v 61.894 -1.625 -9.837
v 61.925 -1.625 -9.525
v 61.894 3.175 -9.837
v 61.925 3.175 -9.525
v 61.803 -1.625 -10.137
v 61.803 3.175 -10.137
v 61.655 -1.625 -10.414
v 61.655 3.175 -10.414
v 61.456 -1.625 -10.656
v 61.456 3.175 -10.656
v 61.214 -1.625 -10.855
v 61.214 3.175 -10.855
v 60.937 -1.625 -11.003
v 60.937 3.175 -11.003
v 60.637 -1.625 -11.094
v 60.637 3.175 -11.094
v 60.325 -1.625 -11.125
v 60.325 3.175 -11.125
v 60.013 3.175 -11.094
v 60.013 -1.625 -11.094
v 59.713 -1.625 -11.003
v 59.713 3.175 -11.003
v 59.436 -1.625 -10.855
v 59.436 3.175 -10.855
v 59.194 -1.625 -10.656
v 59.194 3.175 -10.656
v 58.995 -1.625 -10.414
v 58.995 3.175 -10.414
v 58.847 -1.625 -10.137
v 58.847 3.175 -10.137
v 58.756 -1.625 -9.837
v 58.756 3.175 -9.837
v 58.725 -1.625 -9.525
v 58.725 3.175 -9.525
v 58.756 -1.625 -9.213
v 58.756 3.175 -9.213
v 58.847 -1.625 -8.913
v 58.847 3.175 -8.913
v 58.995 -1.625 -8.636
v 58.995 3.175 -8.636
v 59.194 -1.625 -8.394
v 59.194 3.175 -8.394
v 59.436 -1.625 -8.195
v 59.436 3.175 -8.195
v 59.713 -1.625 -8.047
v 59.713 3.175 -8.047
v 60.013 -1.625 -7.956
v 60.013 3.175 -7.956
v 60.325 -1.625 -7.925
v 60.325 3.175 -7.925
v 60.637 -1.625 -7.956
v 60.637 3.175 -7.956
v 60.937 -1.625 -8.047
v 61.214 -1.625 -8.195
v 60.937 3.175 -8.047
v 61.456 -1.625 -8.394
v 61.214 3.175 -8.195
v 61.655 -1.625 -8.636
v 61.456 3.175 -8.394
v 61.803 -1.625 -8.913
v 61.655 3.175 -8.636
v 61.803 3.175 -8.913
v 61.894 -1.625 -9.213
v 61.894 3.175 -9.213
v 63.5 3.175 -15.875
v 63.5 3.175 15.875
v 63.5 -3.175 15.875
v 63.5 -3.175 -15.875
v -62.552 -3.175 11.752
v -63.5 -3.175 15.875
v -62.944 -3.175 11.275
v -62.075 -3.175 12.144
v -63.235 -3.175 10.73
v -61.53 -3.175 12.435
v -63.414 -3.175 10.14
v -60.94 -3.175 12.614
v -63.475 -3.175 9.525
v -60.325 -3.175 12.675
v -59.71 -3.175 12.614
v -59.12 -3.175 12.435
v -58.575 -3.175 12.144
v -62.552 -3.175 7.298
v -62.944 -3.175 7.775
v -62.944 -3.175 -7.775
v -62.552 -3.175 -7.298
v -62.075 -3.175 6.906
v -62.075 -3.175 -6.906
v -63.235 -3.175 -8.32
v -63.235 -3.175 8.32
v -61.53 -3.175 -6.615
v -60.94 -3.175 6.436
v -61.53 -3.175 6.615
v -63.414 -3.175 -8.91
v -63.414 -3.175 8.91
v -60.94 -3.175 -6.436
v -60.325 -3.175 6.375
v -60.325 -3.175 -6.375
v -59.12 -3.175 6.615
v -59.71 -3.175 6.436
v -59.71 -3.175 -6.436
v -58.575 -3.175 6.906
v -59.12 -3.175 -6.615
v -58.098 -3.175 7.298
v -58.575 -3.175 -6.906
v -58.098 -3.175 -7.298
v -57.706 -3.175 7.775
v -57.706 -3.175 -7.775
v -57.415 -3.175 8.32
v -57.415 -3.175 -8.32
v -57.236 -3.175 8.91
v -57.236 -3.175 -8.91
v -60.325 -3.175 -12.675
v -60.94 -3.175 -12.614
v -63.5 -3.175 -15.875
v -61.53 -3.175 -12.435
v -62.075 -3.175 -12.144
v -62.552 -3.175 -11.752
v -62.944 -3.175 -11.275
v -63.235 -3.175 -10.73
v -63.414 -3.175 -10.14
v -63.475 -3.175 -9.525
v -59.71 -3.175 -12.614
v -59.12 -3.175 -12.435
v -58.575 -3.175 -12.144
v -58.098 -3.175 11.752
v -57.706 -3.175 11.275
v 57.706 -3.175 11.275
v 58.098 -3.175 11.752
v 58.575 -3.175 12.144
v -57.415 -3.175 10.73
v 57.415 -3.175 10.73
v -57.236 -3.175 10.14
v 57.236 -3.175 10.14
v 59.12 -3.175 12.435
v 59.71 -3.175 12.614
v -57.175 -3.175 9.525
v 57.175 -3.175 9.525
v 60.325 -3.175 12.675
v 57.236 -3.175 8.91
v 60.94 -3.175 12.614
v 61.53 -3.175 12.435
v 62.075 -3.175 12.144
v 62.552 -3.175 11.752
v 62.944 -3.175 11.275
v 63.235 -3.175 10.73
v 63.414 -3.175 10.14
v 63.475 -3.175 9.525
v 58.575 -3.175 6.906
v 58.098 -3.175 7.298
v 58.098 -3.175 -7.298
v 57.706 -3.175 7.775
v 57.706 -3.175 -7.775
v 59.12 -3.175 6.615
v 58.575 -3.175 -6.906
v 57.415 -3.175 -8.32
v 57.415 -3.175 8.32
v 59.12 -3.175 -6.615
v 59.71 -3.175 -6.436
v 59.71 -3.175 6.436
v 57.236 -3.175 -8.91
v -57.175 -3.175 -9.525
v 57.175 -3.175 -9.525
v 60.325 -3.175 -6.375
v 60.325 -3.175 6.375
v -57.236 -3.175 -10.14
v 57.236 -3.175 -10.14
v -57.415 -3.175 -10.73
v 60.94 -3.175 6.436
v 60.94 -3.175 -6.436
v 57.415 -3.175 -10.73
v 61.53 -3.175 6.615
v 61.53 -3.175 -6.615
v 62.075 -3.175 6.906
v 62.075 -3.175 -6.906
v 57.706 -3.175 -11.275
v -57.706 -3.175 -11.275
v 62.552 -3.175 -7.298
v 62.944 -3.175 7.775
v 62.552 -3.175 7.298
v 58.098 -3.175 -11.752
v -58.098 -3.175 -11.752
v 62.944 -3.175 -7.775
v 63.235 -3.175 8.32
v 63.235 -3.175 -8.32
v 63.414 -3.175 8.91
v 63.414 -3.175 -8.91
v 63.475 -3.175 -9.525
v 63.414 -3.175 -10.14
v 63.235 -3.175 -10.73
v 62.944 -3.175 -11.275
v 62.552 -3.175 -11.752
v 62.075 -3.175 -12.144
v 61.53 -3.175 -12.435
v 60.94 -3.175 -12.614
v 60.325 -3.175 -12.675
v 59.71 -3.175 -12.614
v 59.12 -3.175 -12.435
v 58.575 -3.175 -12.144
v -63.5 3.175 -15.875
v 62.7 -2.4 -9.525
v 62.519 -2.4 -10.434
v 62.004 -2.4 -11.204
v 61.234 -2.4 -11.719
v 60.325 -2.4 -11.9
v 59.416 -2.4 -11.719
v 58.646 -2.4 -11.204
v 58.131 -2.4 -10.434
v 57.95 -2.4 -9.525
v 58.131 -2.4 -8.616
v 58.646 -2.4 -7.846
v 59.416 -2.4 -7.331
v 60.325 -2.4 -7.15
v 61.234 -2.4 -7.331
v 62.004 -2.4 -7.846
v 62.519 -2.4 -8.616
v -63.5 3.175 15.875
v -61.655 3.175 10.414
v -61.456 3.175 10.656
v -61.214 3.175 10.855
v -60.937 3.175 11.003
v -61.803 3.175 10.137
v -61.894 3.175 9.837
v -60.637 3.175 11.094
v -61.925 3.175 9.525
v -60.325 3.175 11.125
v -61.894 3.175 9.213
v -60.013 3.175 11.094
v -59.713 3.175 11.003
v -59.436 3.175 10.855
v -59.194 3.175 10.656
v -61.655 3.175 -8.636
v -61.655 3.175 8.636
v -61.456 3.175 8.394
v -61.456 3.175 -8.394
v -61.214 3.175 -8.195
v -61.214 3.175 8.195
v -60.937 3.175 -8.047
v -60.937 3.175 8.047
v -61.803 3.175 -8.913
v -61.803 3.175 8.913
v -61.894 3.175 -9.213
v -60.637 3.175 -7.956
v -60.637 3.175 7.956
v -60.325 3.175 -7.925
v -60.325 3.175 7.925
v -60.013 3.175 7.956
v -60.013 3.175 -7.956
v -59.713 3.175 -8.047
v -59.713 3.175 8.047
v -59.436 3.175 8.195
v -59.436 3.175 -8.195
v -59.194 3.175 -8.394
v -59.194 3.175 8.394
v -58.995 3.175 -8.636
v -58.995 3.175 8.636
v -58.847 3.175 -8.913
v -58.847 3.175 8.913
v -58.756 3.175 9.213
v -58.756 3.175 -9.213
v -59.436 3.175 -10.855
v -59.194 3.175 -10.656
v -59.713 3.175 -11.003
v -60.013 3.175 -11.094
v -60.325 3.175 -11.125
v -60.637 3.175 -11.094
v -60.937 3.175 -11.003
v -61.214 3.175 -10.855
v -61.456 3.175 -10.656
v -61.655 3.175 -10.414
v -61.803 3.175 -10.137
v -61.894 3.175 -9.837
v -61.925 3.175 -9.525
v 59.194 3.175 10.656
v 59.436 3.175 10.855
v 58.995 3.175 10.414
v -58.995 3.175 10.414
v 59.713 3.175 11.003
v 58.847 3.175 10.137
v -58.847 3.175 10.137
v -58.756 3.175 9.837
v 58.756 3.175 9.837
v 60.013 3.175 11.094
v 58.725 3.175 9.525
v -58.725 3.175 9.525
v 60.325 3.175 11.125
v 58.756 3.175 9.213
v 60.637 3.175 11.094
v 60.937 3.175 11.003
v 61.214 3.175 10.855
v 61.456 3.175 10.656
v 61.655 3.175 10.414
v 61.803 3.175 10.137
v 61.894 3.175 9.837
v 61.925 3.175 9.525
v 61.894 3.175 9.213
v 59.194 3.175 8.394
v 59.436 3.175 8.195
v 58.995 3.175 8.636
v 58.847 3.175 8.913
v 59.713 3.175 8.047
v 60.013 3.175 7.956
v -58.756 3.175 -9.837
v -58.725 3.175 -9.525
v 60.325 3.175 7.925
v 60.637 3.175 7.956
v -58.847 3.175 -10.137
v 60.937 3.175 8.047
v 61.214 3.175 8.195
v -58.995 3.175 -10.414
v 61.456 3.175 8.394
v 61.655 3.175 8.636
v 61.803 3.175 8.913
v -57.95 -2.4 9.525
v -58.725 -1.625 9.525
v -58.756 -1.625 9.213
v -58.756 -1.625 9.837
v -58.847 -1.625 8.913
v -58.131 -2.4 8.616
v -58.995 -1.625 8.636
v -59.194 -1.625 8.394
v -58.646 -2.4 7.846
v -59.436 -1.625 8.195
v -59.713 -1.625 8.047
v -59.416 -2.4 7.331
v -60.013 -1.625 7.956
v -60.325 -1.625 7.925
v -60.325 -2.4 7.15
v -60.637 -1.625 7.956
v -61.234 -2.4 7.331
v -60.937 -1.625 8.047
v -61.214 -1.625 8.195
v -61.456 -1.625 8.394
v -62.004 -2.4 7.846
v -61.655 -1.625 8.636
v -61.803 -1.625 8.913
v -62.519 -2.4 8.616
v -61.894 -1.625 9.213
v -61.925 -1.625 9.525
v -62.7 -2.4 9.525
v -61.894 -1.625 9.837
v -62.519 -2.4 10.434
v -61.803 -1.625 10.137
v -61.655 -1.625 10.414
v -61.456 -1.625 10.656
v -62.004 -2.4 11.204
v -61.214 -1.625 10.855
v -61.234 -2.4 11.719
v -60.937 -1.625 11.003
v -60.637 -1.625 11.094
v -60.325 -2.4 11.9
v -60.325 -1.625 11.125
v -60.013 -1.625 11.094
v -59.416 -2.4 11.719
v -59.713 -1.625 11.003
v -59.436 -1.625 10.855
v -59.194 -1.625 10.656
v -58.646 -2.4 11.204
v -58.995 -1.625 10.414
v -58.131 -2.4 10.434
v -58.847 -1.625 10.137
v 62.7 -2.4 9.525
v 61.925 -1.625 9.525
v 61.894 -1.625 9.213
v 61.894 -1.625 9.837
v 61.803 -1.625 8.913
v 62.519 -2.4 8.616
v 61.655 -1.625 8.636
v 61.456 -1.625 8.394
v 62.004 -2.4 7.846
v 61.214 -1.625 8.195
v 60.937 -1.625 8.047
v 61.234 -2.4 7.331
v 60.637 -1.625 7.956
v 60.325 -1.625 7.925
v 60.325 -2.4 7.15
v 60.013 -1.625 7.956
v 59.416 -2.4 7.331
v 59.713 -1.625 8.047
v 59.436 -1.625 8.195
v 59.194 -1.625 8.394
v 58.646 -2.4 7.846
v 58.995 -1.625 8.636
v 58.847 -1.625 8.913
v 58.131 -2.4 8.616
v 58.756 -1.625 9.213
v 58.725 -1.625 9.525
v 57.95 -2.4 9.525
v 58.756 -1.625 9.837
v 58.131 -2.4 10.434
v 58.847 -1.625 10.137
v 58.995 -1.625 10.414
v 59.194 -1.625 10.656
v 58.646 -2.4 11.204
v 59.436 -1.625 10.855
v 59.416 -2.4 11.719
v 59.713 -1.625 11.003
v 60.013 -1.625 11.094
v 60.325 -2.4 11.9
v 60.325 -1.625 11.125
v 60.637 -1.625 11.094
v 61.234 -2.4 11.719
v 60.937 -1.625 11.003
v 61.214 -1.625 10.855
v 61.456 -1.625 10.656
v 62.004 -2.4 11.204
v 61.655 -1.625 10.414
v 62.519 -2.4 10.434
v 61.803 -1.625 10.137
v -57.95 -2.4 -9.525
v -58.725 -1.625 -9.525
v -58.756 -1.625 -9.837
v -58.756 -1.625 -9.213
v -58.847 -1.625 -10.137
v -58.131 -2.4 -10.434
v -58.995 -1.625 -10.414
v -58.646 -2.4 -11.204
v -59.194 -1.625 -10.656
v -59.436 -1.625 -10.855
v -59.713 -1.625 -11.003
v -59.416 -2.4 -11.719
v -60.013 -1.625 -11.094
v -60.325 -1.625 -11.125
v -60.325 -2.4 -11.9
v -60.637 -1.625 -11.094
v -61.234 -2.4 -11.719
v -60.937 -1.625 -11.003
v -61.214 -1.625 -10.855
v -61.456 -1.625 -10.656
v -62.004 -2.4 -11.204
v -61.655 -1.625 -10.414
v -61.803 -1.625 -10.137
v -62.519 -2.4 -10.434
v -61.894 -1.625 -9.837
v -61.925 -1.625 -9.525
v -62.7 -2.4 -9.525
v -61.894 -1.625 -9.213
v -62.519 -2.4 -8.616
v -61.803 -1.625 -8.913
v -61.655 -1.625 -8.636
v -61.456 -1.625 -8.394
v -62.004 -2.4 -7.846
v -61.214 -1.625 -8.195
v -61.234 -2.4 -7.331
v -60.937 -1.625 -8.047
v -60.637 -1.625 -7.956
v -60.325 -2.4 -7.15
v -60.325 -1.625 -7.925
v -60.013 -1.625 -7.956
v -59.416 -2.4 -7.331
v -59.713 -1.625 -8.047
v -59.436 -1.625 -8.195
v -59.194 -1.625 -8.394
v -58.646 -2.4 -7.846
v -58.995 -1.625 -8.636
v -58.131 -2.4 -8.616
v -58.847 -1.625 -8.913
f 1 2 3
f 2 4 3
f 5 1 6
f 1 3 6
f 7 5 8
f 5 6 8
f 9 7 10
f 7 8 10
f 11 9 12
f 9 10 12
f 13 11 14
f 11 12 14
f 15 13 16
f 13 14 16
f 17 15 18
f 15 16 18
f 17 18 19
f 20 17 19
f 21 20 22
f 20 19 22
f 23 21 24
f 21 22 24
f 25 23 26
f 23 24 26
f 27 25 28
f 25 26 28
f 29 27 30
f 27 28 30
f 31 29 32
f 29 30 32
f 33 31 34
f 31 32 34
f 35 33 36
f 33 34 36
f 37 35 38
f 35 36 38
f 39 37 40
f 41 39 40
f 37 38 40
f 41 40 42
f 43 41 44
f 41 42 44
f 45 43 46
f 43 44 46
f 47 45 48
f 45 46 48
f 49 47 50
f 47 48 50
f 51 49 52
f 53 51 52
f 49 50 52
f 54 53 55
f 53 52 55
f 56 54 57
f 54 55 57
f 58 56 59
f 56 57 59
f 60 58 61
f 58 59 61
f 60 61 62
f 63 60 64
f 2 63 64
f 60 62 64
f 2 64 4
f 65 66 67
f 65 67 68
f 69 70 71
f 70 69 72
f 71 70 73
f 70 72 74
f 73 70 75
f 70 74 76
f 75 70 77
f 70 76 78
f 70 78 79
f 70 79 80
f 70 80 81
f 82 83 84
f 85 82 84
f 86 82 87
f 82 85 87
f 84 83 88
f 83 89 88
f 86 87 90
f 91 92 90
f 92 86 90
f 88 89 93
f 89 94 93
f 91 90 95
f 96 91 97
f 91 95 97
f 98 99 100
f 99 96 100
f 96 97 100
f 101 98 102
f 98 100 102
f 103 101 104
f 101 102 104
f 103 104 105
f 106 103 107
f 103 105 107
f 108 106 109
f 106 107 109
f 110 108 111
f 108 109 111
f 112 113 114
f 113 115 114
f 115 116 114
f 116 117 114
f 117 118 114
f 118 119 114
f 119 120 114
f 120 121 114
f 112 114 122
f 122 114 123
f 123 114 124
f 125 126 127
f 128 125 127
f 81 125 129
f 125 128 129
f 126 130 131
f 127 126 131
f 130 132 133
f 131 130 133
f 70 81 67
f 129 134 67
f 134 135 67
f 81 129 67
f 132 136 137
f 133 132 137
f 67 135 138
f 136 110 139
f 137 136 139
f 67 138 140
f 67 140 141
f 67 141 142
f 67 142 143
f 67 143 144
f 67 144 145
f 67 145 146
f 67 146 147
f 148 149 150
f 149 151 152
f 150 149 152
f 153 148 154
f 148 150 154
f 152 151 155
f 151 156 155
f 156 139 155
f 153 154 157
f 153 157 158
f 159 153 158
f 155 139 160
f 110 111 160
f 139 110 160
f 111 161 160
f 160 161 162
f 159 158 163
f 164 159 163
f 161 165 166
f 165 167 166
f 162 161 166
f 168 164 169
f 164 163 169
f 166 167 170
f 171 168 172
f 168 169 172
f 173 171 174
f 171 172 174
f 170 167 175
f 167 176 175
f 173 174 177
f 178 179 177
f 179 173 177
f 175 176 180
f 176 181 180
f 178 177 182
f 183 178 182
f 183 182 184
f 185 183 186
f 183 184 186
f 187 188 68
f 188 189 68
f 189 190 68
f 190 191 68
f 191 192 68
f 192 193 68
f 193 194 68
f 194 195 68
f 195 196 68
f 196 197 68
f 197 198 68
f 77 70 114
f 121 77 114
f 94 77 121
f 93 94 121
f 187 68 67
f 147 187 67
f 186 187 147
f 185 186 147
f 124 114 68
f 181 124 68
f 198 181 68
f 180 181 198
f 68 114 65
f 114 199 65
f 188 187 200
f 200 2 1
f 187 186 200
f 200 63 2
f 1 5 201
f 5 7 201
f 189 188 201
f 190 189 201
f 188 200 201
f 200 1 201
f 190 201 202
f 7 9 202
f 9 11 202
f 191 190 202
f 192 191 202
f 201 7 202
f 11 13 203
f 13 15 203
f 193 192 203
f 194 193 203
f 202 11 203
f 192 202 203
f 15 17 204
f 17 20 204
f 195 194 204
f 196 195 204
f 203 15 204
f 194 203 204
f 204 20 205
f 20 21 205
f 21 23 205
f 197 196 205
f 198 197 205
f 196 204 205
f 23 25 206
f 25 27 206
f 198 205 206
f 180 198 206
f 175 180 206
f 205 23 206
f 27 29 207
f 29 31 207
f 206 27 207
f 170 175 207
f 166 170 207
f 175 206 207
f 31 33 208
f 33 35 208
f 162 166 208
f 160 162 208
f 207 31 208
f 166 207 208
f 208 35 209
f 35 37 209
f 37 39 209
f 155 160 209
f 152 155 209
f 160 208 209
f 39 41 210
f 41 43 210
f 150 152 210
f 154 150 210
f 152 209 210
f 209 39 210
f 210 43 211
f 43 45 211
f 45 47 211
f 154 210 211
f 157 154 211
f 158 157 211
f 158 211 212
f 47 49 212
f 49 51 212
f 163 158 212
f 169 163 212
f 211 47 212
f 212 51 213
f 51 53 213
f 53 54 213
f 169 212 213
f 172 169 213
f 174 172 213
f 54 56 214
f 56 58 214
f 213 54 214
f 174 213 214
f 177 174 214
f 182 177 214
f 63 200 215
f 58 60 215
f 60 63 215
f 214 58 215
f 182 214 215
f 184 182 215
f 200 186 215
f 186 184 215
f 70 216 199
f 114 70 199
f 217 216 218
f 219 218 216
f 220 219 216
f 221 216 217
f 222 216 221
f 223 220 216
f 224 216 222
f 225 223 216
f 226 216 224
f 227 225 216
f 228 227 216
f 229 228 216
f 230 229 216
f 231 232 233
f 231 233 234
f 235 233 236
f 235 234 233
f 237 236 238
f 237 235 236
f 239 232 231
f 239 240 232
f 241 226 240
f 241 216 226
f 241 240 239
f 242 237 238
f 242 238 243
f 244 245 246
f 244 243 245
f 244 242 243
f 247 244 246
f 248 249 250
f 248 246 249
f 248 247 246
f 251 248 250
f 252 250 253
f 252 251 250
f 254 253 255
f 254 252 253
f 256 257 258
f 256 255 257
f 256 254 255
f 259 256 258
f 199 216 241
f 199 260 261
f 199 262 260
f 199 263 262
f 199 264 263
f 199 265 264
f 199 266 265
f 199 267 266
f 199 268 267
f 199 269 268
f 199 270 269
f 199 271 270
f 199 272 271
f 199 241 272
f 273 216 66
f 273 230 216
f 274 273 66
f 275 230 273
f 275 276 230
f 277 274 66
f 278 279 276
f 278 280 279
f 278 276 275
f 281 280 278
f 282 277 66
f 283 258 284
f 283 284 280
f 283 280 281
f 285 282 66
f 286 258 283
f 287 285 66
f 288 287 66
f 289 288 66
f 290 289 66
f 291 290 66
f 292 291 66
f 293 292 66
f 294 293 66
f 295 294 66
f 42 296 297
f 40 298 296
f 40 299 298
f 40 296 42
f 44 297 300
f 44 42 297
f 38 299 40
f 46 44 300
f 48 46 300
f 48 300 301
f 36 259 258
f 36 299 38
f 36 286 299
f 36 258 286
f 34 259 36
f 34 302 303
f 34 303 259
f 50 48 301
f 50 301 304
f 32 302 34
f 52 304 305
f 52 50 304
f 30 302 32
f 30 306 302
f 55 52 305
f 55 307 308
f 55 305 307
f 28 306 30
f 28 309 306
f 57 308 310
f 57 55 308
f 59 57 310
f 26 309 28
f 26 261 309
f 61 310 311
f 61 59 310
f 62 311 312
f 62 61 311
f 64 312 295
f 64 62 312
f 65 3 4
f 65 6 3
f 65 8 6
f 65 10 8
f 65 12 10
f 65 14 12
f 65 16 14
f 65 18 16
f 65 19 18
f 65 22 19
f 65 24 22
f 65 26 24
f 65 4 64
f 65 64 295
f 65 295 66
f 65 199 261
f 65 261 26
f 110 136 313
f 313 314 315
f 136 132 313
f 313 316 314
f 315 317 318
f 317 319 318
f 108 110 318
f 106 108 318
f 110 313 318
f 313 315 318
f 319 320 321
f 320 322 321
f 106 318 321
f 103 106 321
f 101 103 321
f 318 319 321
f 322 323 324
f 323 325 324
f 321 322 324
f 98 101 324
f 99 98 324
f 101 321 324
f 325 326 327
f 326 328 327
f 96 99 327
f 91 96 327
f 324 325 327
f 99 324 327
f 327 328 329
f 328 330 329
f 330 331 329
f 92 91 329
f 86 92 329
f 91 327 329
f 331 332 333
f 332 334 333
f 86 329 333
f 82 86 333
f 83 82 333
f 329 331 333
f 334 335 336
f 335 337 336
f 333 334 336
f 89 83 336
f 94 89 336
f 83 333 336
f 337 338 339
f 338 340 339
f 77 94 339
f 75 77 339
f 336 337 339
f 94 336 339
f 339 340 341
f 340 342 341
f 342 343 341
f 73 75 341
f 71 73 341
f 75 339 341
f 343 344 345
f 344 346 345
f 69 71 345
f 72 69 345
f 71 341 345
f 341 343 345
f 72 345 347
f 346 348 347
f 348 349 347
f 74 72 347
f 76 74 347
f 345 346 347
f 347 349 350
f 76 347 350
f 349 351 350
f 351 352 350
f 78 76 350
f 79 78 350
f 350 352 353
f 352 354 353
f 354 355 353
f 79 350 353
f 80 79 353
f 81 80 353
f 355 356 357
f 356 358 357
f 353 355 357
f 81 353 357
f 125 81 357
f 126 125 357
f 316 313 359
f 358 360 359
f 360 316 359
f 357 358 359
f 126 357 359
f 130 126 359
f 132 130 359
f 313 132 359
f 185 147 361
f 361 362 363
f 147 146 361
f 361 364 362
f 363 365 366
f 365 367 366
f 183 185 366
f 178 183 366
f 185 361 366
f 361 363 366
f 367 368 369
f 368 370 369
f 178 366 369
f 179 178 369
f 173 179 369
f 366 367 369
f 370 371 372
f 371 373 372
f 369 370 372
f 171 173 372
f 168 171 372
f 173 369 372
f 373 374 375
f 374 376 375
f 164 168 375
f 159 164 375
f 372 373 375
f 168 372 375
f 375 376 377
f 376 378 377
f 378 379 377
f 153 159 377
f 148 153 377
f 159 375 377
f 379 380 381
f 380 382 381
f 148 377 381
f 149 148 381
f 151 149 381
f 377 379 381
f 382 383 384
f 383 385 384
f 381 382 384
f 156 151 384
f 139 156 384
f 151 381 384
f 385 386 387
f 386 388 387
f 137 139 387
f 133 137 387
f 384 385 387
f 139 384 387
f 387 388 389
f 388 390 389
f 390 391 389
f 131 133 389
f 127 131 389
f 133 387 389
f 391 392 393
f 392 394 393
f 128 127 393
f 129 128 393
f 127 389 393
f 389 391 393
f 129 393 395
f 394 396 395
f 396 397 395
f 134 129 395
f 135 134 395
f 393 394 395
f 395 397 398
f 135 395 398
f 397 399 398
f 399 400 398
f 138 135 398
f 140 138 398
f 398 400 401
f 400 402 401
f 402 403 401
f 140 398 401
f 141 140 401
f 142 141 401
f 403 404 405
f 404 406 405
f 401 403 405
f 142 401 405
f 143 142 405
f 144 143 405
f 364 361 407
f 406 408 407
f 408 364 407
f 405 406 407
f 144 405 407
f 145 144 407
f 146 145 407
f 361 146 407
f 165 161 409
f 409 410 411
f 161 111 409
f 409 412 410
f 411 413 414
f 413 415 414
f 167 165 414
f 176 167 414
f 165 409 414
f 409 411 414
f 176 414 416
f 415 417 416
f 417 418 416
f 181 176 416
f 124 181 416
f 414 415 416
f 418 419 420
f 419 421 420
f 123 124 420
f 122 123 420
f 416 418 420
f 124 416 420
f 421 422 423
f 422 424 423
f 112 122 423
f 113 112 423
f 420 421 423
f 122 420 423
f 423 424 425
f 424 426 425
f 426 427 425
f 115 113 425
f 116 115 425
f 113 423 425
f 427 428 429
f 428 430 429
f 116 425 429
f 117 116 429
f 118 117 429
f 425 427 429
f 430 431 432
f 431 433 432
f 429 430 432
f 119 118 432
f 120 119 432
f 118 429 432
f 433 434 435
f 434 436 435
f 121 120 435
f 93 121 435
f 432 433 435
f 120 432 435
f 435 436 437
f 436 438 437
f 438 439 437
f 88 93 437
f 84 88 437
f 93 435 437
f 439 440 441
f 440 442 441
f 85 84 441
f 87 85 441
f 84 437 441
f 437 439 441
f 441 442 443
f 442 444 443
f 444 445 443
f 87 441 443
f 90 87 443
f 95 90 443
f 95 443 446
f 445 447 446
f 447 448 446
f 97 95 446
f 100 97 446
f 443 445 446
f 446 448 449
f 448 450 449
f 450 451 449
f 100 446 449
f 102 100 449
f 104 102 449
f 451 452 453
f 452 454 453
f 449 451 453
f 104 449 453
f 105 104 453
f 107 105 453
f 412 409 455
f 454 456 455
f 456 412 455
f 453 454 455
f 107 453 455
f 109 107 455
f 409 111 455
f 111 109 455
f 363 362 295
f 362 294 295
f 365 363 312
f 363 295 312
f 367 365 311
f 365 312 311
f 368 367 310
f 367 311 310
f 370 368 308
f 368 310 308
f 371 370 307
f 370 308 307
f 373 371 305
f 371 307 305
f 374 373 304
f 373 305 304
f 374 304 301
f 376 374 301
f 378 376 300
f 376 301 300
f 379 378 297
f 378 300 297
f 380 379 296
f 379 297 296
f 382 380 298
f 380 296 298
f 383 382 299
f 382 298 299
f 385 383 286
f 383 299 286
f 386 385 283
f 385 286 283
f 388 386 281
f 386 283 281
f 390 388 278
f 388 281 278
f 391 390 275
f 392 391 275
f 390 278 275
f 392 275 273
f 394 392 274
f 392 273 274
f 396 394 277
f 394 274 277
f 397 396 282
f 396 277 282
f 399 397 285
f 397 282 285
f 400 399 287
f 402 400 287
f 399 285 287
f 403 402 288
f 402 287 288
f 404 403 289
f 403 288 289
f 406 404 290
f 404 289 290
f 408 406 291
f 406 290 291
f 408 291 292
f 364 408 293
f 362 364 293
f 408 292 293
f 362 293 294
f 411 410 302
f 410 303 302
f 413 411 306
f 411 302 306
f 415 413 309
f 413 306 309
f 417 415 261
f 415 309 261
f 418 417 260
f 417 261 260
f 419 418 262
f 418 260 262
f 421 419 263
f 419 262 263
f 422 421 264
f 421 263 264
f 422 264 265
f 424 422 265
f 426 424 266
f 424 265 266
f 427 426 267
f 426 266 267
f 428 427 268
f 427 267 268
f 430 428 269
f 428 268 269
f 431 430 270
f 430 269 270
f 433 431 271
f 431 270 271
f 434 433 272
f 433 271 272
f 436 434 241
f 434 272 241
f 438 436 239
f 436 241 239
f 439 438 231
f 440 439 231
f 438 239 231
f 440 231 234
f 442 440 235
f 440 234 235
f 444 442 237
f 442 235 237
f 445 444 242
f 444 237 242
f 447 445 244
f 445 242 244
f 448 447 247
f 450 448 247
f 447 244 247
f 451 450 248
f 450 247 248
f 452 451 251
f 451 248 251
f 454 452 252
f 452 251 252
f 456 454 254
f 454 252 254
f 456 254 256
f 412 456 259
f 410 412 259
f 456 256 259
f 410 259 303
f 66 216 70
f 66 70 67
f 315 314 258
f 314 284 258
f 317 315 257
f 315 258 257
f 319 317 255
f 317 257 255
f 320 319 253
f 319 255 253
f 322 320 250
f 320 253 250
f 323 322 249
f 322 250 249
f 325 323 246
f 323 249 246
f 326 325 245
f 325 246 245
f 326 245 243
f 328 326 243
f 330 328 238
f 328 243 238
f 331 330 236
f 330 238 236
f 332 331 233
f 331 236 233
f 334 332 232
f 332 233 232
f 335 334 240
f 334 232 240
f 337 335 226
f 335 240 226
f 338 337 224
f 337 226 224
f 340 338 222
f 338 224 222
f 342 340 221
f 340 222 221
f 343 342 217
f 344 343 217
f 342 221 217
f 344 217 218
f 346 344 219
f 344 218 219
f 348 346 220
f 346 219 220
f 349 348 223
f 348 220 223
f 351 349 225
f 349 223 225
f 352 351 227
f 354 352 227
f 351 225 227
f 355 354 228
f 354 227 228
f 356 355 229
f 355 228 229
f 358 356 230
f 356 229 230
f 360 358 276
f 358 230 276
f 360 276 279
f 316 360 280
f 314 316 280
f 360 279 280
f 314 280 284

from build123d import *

# Parameters (mm, degrees)
SKETCH1_W                                       = 127
SKETCH1_H                                       = 31.75
BOSS_EXTRUDE1_DEPTH                             = 3.175
CSK_FOR_M3_FLAT_HEAD_MACHINE_SCREW1_D           = 3.2
CSK_FOR_M3_FLAT_HEAD_MACHINE_SCREW1_DEPTH       = 12.7
CSK_FOR_M3_FLAT_HEAD_MACHINE_SCREW1_CSINK_D     = 6.3
CSK_FOR_M3_FLAT_HEAD_MACHINE_SCREW1_CSINK_ANGLE = 90
CSK_FOR_M3_FLAT_HEAD_MACHINE_SCREW1_TIP         = 0.96137699


with BuildPart() as part:
    # Sketch1 → Boss-Extrude1 (new, symmetric)
    with BuildSketch(Plane(origin=(0, 0, 0), x_dir=(1, 0, 0), z_dir=(0, 1, 0))):
        Rectangle(SKETCH1_W, SKETCH1_H)
    extrude(amount=BOSS_EXTRUDE1_DEPTH, both=True)

    # CSK for M3 Flat Head Machine Screw1
    with Locations(Plane(origin=(0, -3.175, 0), x_dir=(-1, 0, 0), z_dir=(0, -1, 0))):
        with Locations((60.325, -9.525), (60.325, 9.525), (-60.325, -9.525), (-60.325, 9.525)):
            CounterSinkHole(CSK_FOR_M3_FLAT_HEAD_MACHINE_SCREW1_D / 2, CSK_FOR_M3_FLAT_HEAD_MACHINE_SCREW1_CSINK_D / 2, depth=CSK_FOR_M3_FLAT_HEAD_MACHINE_SCREW1_DEPTH, counter_sink_angle=CSK_FOR_M3_FLAT_HEAD_MACHINE_SCREW1_CSINK_ANGLE)
            with Locations((0, 0, -(CSK_FOR_M3_FLAT_HEAD_MACHINE_SCREW1_DEPTH + CSK_FOR_M3_FLAT_HEAD_MACHINE_SCREW1_TIP / 2))):  # 118° drill point
                Cone(0, CSK_FOR_M3_FLAT_HEAD_MACHINE_SCREW1_D / 2, CSK_FOR_M3_FLAT_HEAD_MACHINE_SCREW1_TIP, mode=Mode.SUBTRACT)


solid = part.part
